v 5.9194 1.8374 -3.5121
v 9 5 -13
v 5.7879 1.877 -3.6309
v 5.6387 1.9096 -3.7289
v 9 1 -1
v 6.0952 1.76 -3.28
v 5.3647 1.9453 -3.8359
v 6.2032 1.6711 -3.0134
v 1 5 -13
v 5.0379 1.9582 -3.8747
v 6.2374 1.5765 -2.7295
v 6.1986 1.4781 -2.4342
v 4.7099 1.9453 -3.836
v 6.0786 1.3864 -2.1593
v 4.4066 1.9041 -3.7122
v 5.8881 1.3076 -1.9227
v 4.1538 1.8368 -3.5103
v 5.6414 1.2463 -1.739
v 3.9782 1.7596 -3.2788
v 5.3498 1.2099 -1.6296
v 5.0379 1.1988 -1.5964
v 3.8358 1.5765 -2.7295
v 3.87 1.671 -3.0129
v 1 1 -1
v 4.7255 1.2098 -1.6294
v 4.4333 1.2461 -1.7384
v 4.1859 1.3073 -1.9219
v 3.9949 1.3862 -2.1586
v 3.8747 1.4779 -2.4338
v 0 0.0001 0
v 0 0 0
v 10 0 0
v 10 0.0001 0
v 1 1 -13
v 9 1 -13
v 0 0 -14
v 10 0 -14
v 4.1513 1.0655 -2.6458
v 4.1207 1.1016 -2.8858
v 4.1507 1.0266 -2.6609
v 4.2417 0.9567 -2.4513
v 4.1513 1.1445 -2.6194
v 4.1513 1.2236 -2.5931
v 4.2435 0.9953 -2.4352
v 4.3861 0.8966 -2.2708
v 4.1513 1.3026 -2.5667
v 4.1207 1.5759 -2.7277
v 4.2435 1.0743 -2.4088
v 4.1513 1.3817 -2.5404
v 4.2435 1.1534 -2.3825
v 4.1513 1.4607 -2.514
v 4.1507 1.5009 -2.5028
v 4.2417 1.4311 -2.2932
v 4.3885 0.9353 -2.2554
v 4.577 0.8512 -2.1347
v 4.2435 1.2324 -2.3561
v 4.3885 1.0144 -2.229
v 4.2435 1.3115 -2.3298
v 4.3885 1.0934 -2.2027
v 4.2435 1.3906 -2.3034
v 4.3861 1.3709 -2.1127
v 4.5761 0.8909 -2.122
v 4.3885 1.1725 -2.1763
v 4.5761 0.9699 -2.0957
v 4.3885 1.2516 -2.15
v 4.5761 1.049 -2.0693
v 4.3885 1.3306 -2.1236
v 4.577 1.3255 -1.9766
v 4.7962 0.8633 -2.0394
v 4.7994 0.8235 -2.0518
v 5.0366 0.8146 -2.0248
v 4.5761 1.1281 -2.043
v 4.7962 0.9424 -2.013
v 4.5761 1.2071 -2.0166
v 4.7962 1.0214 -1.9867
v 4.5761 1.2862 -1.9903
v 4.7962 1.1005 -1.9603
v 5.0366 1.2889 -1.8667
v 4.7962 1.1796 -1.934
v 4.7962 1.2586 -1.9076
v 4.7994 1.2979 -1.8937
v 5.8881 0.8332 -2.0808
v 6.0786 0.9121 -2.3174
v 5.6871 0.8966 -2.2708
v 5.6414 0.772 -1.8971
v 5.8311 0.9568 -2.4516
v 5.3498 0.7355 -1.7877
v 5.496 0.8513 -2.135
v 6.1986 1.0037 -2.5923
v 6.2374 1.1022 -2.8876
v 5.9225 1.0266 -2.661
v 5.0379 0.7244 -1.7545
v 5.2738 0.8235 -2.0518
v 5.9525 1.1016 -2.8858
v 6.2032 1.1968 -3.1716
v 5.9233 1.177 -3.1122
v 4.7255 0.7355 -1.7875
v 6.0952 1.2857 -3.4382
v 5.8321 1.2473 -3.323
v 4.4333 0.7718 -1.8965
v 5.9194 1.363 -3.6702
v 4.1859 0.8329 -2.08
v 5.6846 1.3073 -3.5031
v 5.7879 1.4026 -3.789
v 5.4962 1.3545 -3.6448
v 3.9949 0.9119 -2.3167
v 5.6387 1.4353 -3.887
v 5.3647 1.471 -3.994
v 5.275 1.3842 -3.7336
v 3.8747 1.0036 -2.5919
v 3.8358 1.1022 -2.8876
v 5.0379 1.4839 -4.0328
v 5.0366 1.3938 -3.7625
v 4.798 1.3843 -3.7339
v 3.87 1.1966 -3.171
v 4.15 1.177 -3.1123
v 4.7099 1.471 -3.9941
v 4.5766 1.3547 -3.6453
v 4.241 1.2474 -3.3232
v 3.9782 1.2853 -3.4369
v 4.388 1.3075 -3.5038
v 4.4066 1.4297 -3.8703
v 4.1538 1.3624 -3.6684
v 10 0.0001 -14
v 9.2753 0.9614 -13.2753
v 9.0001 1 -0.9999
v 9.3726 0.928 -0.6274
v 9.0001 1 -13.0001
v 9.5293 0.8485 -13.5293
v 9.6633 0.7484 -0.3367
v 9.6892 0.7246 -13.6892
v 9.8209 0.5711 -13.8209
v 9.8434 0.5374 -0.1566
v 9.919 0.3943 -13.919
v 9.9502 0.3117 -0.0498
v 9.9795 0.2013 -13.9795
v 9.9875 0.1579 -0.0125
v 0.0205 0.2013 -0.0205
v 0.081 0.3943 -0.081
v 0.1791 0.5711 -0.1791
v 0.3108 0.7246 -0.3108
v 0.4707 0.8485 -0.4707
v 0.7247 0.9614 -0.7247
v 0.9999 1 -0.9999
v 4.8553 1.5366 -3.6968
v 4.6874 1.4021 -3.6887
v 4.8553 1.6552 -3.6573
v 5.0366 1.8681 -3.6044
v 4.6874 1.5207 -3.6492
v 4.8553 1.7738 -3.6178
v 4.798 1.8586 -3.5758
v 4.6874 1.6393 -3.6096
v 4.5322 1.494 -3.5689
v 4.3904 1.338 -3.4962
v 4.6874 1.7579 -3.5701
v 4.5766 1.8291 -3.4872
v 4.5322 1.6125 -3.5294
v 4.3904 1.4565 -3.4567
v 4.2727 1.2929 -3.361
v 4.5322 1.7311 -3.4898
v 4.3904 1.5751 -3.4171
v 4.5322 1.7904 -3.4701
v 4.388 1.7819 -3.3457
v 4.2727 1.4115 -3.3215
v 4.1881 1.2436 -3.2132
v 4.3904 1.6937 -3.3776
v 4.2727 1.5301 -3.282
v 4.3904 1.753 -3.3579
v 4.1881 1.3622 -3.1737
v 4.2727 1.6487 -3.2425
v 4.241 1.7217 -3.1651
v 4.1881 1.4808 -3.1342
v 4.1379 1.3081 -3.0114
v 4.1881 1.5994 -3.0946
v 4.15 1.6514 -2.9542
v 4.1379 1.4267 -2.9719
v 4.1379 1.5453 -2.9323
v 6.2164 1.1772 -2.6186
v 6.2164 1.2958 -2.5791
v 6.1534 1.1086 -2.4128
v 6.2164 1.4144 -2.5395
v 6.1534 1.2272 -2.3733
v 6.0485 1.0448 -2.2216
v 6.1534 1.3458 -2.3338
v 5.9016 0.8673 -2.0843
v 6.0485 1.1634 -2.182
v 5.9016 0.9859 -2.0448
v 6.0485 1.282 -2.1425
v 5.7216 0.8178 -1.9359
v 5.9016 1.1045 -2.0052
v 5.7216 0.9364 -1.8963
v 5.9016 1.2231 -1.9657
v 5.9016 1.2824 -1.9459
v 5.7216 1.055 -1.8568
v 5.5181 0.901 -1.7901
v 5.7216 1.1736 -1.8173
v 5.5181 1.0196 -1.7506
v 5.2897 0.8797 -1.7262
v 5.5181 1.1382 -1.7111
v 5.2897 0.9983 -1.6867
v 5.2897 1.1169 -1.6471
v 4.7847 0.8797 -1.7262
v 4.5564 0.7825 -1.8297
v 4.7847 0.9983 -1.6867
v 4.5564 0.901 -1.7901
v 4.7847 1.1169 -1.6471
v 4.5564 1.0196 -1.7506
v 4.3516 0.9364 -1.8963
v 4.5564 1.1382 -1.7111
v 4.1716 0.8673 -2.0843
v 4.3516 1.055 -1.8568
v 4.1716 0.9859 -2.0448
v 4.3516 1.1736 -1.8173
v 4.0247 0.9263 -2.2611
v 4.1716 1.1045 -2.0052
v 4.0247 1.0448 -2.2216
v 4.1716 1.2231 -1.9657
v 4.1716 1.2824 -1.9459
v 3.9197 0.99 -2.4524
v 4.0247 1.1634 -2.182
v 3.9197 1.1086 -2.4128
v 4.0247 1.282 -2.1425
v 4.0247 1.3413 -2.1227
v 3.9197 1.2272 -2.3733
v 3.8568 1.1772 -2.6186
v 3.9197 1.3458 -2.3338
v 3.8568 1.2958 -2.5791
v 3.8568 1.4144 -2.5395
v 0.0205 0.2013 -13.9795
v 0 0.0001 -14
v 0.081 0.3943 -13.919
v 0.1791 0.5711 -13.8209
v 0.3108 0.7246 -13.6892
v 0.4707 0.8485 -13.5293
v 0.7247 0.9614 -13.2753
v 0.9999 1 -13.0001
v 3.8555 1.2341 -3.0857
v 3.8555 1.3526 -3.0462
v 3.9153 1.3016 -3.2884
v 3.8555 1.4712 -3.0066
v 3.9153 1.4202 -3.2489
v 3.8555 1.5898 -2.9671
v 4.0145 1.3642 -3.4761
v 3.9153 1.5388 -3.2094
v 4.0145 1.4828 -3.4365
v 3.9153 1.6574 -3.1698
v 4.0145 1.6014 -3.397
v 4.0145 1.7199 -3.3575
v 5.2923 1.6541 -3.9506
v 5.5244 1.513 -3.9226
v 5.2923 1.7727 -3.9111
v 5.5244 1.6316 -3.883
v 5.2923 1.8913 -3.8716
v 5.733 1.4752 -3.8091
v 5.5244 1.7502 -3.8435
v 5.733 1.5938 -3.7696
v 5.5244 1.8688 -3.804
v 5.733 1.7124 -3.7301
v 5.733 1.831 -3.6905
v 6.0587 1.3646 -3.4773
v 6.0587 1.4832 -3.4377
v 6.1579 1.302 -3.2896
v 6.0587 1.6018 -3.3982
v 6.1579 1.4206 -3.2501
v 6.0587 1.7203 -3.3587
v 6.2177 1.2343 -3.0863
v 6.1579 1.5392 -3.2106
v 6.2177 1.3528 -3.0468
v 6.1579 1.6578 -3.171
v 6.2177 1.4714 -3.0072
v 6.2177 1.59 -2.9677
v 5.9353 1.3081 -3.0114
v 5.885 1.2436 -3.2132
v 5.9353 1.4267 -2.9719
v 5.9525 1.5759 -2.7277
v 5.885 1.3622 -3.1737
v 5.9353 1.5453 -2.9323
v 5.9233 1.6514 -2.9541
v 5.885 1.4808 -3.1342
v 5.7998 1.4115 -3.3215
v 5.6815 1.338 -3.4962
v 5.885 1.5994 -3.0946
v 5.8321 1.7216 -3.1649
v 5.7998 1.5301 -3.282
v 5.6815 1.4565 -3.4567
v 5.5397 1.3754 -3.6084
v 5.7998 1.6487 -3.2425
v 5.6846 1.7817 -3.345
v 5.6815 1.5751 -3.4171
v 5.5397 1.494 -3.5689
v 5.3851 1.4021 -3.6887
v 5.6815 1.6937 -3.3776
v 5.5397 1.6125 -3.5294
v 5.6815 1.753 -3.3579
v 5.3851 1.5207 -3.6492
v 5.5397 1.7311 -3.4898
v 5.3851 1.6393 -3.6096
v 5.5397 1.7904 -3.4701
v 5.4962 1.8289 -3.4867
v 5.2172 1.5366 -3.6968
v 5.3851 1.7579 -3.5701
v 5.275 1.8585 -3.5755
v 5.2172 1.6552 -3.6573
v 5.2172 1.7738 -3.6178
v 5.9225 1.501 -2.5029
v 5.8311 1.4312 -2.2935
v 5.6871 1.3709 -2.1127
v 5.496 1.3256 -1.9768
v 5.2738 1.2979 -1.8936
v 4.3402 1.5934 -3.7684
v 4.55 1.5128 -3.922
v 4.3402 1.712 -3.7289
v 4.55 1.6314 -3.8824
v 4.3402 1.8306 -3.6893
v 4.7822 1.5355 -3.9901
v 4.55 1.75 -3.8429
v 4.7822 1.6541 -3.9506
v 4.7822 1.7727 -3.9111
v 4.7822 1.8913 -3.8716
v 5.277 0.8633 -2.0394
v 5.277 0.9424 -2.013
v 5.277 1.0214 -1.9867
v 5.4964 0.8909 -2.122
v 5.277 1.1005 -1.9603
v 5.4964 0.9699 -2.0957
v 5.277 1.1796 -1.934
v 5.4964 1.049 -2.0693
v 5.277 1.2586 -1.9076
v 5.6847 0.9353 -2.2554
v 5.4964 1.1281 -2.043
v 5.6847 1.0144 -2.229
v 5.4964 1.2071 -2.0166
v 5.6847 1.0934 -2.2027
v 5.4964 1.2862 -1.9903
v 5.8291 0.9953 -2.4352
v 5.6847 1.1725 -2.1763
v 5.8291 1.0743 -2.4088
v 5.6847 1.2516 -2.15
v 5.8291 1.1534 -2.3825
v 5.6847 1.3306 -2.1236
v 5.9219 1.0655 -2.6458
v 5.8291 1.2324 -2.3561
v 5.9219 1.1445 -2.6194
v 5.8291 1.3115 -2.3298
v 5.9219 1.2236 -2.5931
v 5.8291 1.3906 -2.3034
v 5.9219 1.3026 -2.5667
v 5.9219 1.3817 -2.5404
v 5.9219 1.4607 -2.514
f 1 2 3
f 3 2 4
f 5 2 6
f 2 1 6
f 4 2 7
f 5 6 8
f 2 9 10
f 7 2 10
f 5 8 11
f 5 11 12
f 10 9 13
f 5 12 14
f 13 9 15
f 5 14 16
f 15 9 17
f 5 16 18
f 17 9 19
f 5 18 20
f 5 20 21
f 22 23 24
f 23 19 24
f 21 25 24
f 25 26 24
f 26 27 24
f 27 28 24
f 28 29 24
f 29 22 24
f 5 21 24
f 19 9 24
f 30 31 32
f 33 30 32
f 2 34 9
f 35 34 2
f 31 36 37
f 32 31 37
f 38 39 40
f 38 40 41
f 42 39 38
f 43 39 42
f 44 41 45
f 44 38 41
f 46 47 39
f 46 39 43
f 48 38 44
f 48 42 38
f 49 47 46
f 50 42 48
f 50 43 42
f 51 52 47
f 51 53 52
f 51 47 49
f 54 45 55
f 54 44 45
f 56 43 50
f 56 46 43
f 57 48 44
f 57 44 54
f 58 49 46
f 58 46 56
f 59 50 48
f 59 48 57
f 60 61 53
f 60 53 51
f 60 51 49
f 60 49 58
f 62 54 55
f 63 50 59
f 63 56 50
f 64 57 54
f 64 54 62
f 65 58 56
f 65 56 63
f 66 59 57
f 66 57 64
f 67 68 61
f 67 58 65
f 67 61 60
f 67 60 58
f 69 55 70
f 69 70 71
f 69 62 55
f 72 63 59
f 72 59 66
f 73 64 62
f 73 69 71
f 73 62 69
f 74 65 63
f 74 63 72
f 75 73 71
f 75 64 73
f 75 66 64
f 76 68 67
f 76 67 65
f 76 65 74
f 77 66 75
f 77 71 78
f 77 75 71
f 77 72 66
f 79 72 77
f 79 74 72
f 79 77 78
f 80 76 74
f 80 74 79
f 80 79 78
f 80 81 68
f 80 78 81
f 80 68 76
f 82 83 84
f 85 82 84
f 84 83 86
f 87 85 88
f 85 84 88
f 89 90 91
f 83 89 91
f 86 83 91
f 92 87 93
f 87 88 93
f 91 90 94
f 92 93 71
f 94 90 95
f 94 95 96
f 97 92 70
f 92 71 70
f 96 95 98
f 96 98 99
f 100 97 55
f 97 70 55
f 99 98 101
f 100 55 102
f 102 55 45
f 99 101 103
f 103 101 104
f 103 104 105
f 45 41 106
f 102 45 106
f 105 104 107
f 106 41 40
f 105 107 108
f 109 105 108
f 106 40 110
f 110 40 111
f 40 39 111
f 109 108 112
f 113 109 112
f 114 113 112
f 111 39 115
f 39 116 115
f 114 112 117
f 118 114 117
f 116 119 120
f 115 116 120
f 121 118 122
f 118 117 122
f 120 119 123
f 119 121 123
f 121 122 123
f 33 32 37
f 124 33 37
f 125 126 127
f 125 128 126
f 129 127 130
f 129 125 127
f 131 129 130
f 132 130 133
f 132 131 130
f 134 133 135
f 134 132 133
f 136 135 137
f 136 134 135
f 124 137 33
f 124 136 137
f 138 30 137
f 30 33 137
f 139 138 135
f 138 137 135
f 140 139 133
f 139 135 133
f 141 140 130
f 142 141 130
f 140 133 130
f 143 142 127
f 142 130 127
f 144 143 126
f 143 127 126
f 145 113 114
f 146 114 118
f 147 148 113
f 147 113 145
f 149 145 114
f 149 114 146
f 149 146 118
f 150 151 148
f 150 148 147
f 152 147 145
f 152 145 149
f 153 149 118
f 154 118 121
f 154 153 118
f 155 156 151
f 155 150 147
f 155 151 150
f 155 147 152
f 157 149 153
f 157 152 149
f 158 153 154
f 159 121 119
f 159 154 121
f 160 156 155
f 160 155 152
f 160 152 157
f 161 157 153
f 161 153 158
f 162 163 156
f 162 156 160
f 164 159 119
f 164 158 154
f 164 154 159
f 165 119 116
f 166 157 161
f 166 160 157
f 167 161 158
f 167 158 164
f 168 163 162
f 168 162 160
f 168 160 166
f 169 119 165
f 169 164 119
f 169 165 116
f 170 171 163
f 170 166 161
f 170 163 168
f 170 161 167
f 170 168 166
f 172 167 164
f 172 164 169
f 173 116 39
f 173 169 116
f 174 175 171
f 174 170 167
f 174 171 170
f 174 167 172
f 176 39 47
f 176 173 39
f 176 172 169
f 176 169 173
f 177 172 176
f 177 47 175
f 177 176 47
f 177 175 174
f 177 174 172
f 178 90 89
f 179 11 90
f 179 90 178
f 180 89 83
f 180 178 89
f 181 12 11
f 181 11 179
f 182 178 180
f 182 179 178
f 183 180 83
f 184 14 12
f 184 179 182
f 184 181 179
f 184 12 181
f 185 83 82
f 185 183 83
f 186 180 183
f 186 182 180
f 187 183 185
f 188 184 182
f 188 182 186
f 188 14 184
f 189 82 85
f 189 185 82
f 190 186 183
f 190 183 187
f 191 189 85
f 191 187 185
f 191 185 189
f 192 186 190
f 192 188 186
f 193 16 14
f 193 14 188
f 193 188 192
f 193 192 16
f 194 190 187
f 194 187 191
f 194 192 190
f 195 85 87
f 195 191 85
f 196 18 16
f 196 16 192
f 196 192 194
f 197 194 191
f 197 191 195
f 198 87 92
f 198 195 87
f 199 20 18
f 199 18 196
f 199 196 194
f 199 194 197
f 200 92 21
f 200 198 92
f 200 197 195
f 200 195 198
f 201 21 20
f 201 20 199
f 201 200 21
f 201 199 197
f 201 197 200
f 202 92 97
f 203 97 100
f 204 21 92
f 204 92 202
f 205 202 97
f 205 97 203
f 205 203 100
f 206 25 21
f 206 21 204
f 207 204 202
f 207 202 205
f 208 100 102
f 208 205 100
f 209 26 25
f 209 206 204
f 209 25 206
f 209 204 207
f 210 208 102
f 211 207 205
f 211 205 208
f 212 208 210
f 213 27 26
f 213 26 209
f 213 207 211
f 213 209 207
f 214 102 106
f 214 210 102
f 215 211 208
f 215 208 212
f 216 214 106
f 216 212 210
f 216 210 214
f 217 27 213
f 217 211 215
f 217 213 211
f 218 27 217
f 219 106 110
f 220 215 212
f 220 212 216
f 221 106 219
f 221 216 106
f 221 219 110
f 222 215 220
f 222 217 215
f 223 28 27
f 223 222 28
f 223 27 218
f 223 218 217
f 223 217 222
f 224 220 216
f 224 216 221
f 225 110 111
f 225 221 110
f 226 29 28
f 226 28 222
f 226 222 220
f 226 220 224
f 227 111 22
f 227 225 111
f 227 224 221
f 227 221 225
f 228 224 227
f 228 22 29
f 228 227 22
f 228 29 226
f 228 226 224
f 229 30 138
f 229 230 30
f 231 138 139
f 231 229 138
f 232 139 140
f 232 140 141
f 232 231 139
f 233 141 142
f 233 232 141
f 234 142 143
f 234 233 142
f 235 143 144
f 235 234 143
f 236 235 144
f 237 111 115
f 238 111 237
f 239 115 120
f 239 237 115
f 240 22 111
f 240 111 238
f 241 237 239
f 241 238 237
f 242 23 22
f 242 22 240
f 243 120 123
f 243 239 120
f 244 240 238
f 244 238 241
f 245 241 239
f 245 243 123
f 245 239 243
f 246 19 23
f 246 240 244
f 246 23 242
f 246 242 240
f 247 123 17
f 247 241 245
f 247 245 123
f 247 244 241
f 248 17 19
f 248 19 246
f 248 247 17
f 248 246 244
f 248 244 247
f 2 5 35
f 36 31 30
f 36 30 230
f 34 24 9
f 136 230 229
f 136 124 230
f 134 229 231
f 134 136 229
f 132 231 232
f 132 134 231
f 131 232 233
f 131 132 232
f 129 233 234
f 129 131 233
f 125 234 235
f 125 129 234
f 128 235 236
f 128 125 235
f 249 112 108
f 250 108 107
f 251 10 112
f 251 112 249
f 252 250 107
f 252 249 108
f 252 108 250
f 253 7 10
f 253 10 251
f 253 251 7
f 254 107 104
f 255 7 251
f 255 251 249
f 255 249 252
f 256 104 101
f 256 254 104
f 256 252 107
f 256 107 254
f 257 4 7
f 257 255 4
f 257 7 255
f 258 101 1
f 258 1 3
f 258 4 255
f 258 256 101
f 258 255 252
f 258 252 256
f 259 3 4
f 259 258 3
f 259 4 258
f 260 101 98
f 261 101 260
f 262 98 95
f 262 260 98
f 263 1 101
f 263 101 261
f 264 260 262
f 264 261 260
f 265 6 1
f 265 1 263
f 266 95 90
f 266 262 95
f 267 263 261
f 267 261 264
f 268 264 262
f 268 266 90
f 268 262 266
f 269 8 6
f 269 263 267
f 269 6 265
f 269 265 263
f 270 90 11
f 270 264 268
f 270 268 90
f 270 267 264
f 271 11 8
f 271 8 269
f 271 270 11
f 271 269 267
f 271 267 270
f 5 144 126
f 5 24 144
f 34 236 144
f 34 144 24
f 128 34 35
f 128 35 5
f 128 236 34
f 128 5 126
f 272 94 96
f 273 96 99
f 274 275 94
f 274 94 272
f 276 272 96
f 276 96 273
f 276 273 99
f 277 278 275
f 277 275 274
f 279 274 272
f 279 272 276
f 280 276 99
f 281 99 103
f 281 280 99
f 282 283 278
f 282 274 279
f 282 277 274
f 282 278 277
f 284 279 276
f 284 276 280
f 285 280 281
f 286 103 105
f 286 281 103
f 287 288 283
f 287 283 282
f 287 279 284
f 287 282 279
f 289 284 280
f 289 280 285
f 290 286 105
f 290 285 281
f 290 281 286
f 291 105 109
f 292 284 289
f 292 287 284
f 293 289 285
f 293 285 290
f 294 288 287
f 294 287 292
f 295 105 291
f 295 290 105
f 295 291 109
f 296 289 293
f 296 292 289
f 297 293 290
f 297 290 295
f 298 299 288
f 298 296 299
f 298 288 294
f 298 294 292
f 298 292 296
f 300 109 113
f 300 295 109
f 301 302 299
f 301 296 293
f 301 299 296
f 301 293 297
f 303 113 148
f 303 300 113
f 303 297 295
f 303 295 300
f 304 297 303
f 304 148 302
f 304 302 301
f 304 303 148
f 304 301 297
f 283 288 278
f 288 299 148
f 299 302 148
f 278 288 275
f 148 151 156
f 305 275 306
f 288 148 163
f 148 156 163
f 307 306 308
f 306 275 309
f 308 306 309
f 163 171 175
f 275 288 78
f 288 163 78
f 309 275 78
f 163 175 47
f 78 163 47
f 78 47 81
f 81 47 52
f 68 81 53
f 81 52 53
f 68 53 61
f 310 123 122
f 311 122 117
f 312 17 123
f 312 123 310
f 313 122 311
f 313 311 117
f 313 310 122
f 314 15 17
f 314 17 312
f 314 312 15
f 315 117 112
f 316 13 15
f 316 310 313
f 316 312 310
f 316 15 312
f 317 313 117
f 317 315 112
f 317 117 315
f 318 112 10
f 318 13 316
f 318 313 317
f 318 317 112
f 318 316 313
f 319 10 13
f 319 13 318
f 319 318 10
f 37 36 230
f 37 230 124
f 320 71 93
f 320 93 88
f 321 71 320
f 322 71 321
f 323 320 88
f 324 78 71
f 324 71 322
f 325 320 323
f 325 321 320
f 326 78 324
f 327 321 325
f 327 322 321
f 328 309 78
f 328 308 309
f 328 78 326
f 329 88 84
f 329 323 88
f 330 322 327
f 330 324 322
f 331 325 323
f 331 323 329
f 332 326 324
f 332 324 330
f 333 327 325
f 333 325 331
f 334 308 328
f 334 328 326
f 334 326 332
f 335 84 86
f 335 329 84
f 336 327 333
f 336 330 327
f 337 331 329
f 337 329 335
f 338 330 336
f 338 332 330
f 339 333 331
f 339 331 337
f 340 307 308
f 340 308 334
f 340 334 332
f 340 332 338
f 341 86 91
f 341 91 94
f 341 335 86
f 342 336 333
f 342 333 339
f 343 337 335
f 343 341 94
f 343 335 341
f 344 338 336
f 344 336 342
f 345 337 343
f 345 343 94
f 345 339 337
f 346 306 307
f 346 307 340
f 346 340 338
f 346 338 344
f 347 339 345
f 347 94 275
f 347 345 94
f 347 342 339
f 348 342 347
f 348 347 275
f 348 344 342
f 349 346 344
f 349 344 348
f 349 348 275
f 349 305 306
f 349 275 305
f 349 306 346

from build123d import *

# Parameters (mm, degrees)
SKETCH1_W           = 10
SKETCH1_H           = 14
BOSS_EXTRUDE1_DEPTH = 1
SKETCH2_W           = 8
SKETCH2_H           = 12
BOSS_EXTRUDE2_DEPTH = 4
CUT_EXTRUDE1_DEPTH  = 8
CUT_EXTRUDE2_DEPTH  = 0.5
FILLET1_R           = 1


with BuildPart() as part:
    # Sketch1 → Boss-Extrude1 (new body)
    with BuildSketch(Plane(origin=(0, 0, 0), x_dir=(1, 0, 0), z_dir=(0, 1, 0))):
        with Locations((5, 7)):
            Rectangle(SKETCH1_W, SKETCH1_H)
    extrude(amount=BOSS_EXTRUDE1_DEPTH)

    # Sketch2 → Boss-Extrude2 (add)
    with BuildSketch(Plane(origin=(0, 1, 0), x_dir=(1, 0, 0), z_dir=(0, 1, 0))):
        with Locations((5, 7)):
            Rectangle(SKETCH2_W, SKETCH2_H)
    extrude(amount=BOSS_EXTRUDE2_DEPTH)

    # Sketch3 → Cut-Extrude1 (cut)
    with BuildSketch(Plane.ZY.offset(-1)):
        Polygon((-13, 5), (-1, 1), (-1, 5), align=None)
    extrude(amount=-CUT_EXTRUDE1_DEPTH, mode=Mode.SUBTRACT)

    # Sketch4 → Cut-Extrude2 (cut)
    with BuildSketch(Plane(origin=(0, 0.6, 0.2), x_dir=(1, 0, 0), z_dir=(0, 0.9486832980505139, 0.3162277660168379))):
        with BuildLine():
            add(Edge.make_bspline(
                [(5.03786558, 4.295135467), (5.08140052, 4.294208466), (5.166761899, 4.292390843), (5.291773338, 4.27296441), (5.411103569, 4.243257872), (5.525209614, 4.202190098), (5.632630111, 4.1471429), (5.73492974, 4.081457329), (5.831828026, 4.003640262), (5.88990606, 3.943444014), (5.919386013, 3.912888873)],
                knots=[0, 0, 0, 0, 1.054011418, 2.066658804, 3.057071809, 4.030435133, 4.997543892, 5.974964718, 6.972108034, 8, 8, 8, 8], degree=3))
            add(Edge.make_bspline(
                [(5.919386013, 3.912888873), (5.944769642, 3.883666186), (5.995045659, 3.825786351), (6.059512418, 3.73193733), (6.115049119, 3.634745954), (6.159556233, 3.532921593), (6.194649076, 3.427353141), (6.219564387, 3.317677745), (6.23438432, 3.204137616), (6.236382726, 3.127026992), (6.237394827, 3.087974009)],
                knots=[0, 0, 0, 0, 1.025258237, 2.030674902, 3.01204498, 3.988269485, 4.97094183, 5.956517959, 6.965070386, 8, 8, 8, 8], degree=3))
            add(Edge.make_bspline(
                [(6.237394827, 3.087974009), (6.236504614, 3.048694671), (6.234745511, 2.971076867), (6.21810523, 2.856759299), (6.192223459, 2.745911139), (6.155183149, 2.638996467), (6.107686864, 2.535688473), (6.049728883, 2.436438382), (5.980902488, 2.341050376), (5.902884577, 2.250334422), (5.816658946, 2.166726499), (5.723117869, 2.093857283), (5.624099567, 2.031426329), (5.518287382, 1.98113758), (5.40664759, 1.941486638), (5.288939393, 1.913637337), (5.16534565, 1.896799238), (5.080956671, 1.894636997), (5.03786558, 1.893532903)],
                knots=[0, 0, 0, 0, 0.998656419, 1.973391657, 2.932242238, 3.890759089, 4.846373663, 5.82037756, 6.809684879, 7.83454468, 8.860553229, 9.859544525, 10.845671541, 11.83227036, 12.833544569, 13.85385346, 14.904124723, 16, 16, 16, 16], degree=3))
            add(Edge.make_bspline(
                [(5.03786558, 1.893532903), (4.99456337, 1.894640703), (4.909753804, 1.896810384), (4.785723807, 1.913571919), (4.667804652, 1.941473803), (4.556018709, 1.981267886), (4.449751598, 2.031427936), (4.350159562, 2.09366854), (4.256542495, 2.166748109), (4.170298624, 2.250328567), (4.092285603, 2.341051884), (4.023457946, 2.436437991), (3.965500293, 2.535688575), (3.918003922, 2.63899644), (3.880963635, 2.745911146), (3.855081858, 2.856759298), (3.838441579, 2.971076868), (3.836682476, 3.048694671), (3.835792263, 3.087974009)],
                knots=[0, 0, 0, 0, 1.099876186, 2.154163076, 3.173186993, 4.173200201, 5.163417411, 6.152872554, 7.150605724, 8.17532212, 9.198891216, 10.186952605, 11.159729845, 12.11414092, 13.071450619, 14.029093627, 15.002601286, 16, 16, 16, 16], degree=3))
            add(Edge.make_bspline(
                [(3.835792263, 3.087974009), (3.836811266, 3.126814733), (3.838828716, 3.203712691), (3.853633749, 3.317039381), (3.878451869, 3.426529156), (3.913586778, 3.531690123), (3.95850413, 3.633068269), (4.013260441, 3.730499794), (4.078384801, 3.823924442), (4.128460857, 3.881729471), (4.153801077, 3.91098082)],
                knots=[0, 0, 0, 0, 1.031353054, 2.041901799, 3.029428768, 4.008703097, 4.981709435, 5.96992636, 6.972712378, 8, 8, 8, 8], degree=3))
            add(Edge.make_bspline(
                [(4.153801077, 3.91098082), (4.183236584, 3.941800943), (4.241126689, 4.002414139), (4.338507321, 4.080004357), (4.440555287, 4.147056796), (4.549162899, 4.20101022), (4.663175206, 4.243499447), (4.783116947, 4.273041021), (4.908552593, 4.29232085), (4.994331678, 4.294187911), (5.03786558, 4.295135467)],
                knots=[0, 0, 0, 0, 1.027980169, 2.021703884, 2.998553061, 3.971491411, 4.943284454, 5.930300938, 6.949603206, 8, 8, 8, 8], degree=3))
        make_face()
        with BuildLine():
            add(Edge.make_bspline(
                [(5.036593545, 4.01019957), (5.005807283, 4.009324547), (4.945029502, 4.007597091), (4.85556745, 3.99445812), (4.769443168, 3.973641456), (4.686493259, 3.944064919), (4.606997453, 3.905875204), (4.530879638, 3.858968334), (4.457915924, 3.803965581), (4.389533624, 3.740953014), (4.326775384, 3.672119926), (4.271913219, 3.598778915), (4.225263301, 3.522119587), (4.186401157, 3.442062224), (4.157456779, 3.357795534), (4.136435537, 3.270273819), (4.123308962, 3.179318762), (4.121597747, 3.117486981), (4.12072816, 3.086065956)],
                knots=[0, 0, 0, 0, 1.021534396, 2.016698045, 2.994645724, 3.958388632, 4.93408049, 5.916473867, 6.921342795, 7.962252576, 8.998418191, 10.008913653, 10.997312074, 11.973003931, 12.956656626, 13.948281152, 14.957379055, 16, 16, 16, 16], degree=3))
            add(Edge.make_bspline(
                [(4.12072816, 3.086065956), (4.122185779, 3.045469474), (4.125078879, 2.964893049), (4.148605843, 2.846228674), (4.187963397, 2.732307994), (4.24111043, 2.623798843), (4.307700357, 2.523403277), (4.386156481, 2.433894145), (4.475636781, 2.356618444), (4.575074606, 2.29250082), (4.68243888, 2.241555899), (4.796064257, 2.205452542), (4.91457403, 2.181983221), (4.995564407, 2.179650527), (5.036593545, 2.178468801)],
                knots=[0, 0, 0, 0, 1.016792936, 2.018143844, 3.017858371, 4.030088057, 5.03801393, 6.028138512, 7.003788237, 7.991172063, 8.984598303, 9.972568034, 10.972917682, 12, 12, 12, 12], degree=3))
            add(Edge.make_bspline(
                [(5.036593545, 2.178468801), (5.077620322, 2.179657412), (5.158606041, 2.182003698), (5.276951152, 2.205334341), (5.390265969, 2.241714091), (5.497518728, 2.292443524), (5.596911289, 2.356861929), (5.687035135, 2.433457785), (5.764821375, 2.52364035), (5.831345431, 2.623931823), (5.885362834, 2.732139771), (5.924536167, 2.846249699), (5.948119691, 2.964887694), (5.951005157, 3.04546768), (5.952458929, 3.086065956)],
                knots=[0, 0, 0, 0, 1.02726834, 2.027799167, 3.010890988, 4.004497153, 4.992059811, 5.971914811, 6.958719428, 7.966827853, 8.981595046, 9.981490638, 10.983022906, 12, 12, 12, 12], degree=3))
            add(Edge.make_bspline(
                [(5.952458929, 3.086065956), (5.951589641, 3.117487169), (5.949879016, 3.179319319), (5.936748155, 3.270271688), (5.915742773, 3.357803351), (5.886739949, 3.442033382), (5.848046665, 3.522326868), (5.800497145, 3.598553835), (5.745859001, 3.672373988), (5.68234347, 3.740730505), (5.614032548, 3.803990145), (5.541039264, 3.858989662), (5.465034319, 3.905669053), (5.385769462, 3.944391571), (5.302808918, 3.973372372), (5.216805308, 3.994578317), (5.127724959, 4.007541566), (5.06716497, 4.009307902), (5.036593545, 4.01019957)],
                knots=[0, 0, 0, 0, 1.042956736, 2.052379634, 3.044323526, 4.02829302, 5.004299113, 5.996692471, 7.007513377, 8.048758398, 9.090003419, 10.095195979, 11.07790575, 12.047570684, 13.018257071, 13.989683339, 14.985167495, 16, 16, 16, 16], degree=3))
        make_face(mode=Mode.SUBTRACT)
    extrude(amount=-CUT_EXTRUDE2_DEPTH, mode=Mode.SUBTRACT)

    # Fillet1
    fillet1_edges = [part.edges().sort_by_distance(p)[0] for p in [
        (5, 1, -14),
        (10, 1, -7),
        (5, 1, 0),
        (0, 1, -7),
    ]]
    fillet(fillet1_edges, radius=FILLET1_R - 0.0001)  # a hair under: the kernel refuses the full size


solid = part.part
